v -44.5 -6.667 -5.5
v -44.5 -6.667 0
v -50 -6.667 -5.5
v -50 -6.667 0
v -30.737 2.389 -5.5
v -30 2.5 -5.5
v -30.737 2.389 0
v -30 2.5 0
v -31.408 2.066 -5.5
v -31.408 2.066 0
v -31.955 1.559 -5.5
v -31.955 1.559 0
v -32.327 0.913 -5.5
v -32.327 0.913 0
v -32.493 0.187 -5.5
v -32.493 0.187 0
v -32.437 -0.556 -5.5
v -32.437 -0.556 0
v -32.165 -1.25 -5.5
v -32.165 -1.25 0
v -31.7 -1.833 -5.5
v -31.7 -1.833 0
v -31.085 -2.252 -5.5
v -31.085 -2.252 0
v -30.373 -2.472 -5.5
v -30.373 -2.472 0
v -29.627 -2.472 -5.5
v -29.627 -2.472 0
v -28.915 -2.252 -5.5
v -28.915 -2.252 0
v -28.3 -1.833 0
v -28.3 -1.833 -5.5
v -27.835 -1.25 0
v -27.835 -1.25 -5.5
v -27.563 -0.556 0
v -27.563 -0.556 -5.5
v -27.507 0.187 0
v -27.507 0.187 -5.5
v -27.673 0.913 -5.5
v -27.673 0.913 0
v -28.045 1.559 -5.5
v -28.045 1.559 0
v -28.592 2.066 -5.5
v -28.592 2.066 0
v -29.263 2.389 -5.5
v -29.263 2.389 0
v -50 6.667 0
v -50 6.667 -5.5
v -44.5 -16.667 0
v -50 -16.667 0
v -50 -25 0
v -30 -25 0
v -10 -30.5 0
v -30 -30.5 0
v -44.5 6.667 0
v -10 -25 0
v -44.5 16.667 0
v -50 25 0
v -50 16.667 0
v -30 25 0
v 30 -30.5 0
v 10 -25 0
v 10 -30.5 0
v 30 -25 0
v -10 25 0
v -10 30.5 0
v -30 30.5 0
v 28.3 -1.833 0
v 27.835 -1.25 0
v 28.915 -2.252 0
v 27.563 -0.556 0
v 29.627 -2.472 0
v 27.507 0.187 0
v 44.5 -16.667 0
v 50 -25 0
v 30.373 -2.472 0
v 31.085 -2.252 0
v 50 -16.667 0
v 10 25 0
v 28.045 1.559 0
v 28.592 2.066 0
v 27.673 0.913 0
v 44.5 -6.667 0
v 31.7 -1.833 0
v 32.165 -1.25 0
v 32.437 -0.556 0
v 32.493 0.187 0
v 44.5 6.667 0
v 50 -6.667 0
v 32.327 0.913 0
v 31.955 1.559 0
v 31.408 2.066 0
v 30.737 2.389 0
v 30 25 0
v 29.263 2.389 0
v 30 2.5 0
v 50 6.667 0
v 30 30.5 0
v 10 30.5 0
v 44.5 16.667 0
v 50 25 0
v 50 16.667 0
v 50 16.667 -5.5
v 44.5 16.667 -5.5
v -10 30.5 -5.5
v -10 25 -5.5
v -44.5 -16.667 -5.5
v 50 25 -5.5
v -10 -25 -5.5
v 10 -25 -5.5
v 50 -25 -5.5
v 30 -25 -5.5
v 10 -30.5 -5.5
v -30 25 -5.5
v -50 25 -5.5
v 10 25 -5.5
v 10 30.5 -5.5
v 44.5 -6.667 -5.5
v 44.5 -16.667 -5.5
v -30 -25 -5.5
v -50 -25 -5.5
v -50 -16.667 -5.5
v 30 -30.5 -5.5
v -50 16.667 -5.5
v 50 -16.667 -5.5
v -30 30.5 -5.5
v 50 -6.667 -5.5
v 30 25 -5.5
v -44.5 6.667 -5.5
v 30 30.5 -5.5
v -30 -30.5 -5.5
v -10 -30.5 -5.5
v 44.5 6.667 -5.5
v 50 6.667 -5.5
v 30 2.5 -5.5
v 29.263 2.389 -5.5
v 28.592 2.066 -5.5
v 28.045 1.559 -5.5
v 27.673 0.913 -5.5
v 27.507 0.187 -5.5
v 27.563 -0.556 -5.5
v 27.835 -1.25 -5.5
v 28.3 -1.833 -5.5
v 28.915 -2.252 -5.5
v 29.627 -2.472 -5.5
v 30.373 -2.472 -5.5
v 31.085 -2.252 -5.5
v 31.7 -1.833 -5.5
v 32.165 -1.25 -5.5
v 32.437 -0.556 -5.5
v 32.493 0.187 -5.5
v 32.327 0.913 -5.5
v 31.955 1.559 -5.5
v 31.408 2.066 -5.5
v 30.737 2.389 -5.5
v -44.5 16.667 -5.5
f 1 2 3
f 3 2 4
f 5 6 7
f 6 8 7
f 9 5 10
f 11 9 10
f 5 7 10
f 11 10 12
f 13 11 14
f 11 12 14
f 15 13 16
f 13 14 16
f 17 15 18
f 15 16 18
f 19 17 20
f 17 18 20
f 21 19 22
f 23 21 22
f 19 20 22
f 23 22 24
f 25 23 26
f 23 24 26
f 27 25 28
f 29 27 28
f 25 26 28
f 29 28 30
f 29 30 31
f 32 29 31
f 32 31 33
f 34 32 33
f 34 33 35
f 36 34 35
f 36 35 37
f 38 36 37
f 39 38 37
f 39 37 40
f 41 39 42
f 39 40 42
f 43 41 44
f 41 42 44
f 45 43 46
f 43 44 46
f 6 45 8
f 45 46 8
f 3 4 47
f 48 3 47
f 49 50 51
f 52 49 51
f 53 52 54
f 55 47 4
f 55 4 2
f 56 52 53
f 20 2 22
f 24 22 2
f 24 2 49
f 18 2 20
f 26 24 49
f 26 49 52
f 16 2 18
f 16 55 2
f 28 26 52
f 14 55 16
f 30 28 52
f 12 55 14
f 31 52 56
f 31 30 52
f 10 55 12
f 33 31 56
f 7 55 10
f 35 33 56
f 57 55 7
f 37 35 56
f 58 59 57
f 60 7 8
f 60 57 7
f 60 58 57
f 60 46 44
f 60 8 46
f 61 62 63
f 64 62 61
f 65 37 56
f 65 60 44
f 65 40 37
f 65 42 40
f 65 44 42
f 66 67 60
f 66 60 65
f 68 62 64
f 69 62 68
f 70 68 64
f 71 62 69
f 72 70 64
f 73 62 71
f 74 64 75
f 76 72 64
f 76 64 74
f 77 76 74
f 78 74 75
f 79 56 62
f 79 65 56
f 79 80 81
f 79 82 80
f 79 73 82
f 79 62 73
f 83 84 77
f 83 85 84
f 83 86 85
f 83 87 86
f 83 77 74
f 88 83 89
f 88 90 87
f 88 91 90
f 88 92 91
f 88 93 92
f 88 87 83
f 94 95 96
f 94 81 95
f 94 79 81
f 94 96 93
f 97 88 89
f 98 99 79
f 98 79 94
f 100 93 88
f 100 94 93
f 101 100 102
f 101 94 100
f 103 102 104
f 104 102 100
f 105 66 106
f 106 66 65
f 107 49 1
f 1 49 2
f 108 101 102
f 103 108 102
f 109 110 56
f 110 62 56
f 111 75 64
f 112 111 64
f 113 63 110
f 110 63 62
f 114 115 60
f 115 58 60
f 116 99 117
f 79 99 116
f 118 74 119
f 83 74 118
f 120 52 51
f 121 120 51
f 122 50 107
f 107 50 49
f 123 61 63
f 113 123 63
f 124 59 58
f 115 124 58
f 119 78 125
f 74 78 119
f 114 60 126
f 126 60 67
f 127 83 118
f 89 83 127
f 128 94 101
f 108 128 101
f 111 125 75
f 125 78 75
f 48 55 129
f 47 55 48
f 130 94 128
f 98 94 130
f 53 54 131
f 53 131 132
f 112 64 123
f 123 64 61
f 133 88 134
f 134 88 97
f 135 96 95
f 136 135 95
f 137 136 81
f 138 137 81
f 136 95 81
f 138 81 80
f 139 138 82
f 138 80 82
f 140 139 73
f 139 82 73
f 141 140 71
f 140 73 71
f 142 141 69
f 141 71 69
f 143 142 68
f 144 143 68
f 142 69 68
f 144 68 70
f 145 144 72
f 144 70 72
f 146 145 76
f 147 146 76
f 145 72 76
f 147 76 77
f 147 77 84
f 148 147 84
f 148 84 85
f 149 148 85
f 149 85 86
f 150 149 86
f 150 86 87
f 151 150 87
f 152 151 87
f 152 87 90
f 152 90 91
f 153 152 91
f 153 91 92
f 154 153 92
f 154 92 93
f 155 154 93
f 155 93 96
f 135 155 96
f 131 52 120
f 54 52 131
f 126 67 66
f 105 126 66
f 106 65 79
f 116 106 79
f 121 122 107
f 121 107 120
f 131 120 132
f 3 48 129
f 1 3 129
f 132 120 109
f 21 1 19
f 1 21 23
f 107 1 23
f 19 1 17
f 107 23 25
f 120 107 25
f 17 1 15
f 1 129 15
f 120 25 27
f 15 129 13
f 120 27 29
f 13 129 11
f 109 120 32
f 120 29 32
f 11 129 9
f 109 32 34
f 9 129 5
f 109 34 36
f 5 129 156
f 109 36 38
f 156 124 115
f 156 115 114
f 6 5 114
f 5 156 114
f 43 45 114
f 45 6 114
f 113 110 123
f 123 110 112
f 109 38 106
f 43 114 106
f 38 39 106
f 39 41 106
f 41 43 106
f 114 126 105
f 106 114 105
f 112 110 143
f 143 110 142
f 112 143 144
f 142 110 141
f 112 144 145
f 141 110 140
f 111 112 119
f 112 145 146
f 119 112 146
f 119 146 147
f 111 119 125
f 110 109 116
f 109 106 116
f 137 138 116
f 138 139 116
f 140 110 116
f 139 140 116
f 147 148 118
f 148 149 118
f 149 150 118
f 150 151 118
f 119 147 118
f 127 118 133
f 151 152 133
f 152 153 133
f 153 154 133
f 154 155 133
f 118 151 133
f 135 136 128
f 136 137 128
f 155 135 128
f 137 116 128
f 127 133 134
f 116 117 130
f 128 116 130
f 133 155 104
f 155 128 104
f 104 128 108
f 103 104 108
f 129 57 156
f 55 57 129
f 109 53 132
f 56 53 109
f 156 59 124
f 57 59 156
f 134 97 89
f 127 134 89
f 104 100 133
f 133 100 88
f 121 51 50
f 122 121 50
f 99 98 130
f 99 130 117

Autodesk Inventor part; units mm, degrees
ref_plane "YZ Plane" through (0, 0, 0) normal (1, 0, 0) x (0, 1, 0)
ref_plane "XZ Plane" through (0, 0, 0) normal (0, 1, 0) x (-1, 0, 0)
ref_plane "XY Plane" through (0, 0, 0) normal (0, 0, 1) x (1, 0, 0)
sketch "Block1" plane through (0, 0, 0) normal (0, 0, 1) x (1, 0, 0)
  line L0 (-30.1, 34.1) -> (-9.9, 34.1)
  line L1 (-9.9, 34.1) -> (-9.9, 25.1)
  line L2 (-9.9, 25.1) -> (9.9, 25.1)
  line L3 (9.9, 25.1) -> (9.9, 34.1)
  line L4 (9.9, 34.1) -> (30.1, 34.1)
  line L5 (30.1, 34.1) -> (30.1, 25.1)
  line L6 (30.1, 25.1) -> (50.1, 25.1)
  line L7 (50.1, 25.1) -> (50.1, 16.5667)
  line L8 (50.1, 16.5667) -> (41.1, 16.5667)
  line L9 (41.1, 16.5667) -> (41.1, 6.7667)
  line L10 (41.1, 6.7667) -> (50.1, 6.7667)
  line L11 (50.1, 6.7667) -> (50.1, -6.7667)
  line L12 (50.1, -6.7667) -> (41.1, -6.7667)
  line L13 (41.1, -6.7667) -> (41.1, -16.5667)
  line L14 (41.1, -16.5667) -> (50.1, -16.5667)
  line L15 (50.1, -16.5667) -> (50.1, -25.1)
  line L16 (50.1, -25.1) -> (30.1, -25.1)
  line L17 (30.1, -25.1) -> (30.1, -34.1)
  line L18 (30.1, -34.1) -> (9.9, -34.1)
  line L19 (9.9, -34.1) -> (9.9, -25.1)
  line L20 (9.9, -25.1) -> (-9.9, -25.1)
  line L21 (-9.9, -25.1) -> (-9.9, -34.1)
  line L22 (-9.9, -34.1) -> (-30.1, -34.1)
  line L23 (-30.1, -34.1) -> (-30.1, -25.1)
  line L24 (-30.1, -25.1) -> (-50.1, -25.1)
  line L25 (-50.1, -25.1) -> (-50.1, -16.5667)
  line L26 (-50.1, -16.5667) -> (-41.1, -16.5667)
  line L27 (-41.1, -16.5667) -> (-41.1, -6.7667)
  line L28 (-41.1, -6.7667) -> (-50.1, -6.7667)
  line L29 (-50.1, -6.7667) -> (-50.1, 6.7667)
  line L30 (-50.1, 6.7667) -> (-41.1, 6.7667)
  line L31 (-41.1, 6.7667) -> (-41.1, 16.5667)
  line L32 (-41.1, 16.5667) -> (-50.1, 16.5667)
  line L33 (-50.1, 16.5667) -> (-50.1, 25.1)
  line L34 (-50.1, 25.1) -> (-30.1, 25.1)
  line L35 (-30.1, 25.1) -> (-30.1, 34.1)
  circle A0 centre (-30, 0) radius 4.6
  circle A1 centre (30, 0) radius 4.6
  point P0 (0, 0)
sketch "Block2" plane through (0, 0, 0) normal (0, 0, 1) x (1, 0, 0)
  line L0 (9.8, 34.2) -> (30.2, 34.2)
  line L1 (30.2, 34.2) -> (30.2, 25.2)
  line L2 (30.2, 25.2) -> (50.2, 25.2)
  line L3 (50.2, 25.2) -> (50.2, 16.4667)
  line L4 (50.2, 16.4667) -> (41.2, 16.4667)
  line L5 (41.2, 16.4667) -> (41.2, 6.8667)
  line L6 (41.2, 6.8667) -> (50.2, 6.8667)
  line L7 (50.2, 6.8667) -> (50.2, -6.8667)
  line L8 (50.2, -6.8667) -> (41.2, -6.8667)
  line L9 (41.2, -6.8667) -> (41.2, -16.4667)
  line L10 (41.2, -16.4667) -> (50.2, -16.4667)
  line L11 (50.2, -16.4667) -> (50.2, -25.2)
  line L12 (50.2, -25.2) -> (30.2, -25.2)
  line L13 (30.2, -25.2) -> (30.2, -34.2)
  line L14 (30.2, -34.2) -> (9.8, -34.2)
  line L15 (9.8, -34.2) -> (9.8, -25.2)
  line L16 (9.8, -25.2) -> (-9.8, -25.2)
  line L17 (-9.8, -25.2) -> (-9.8, -34.2)
  line L18 (-9.8, -34.2) -> (-30.2, -34.2)
  line L19 (-30.2, -34.2) -> (-30.2, -25.2)
  line L20 (-30.2, -25.2) -> (-50.2, -25.2)
  line L21 (-50.2, -25.2) -> (-50.2, -16.4667)
  line L22 (-50.2, -16.4667) -> (-41.2, -16.4667)
  line L23 (-41.2, -16.4667) -> (-41.2, -6.8667)
  line L24 (-41.2, -6.8667) -> (-50.2, -6.8667)
  line L25 (-50.2, -6.8667) -> (-50.2, 6.8667)
  line L26 (-50.2, 6.8667) -> (-41.2, 6.8667)
  line L27 (-41.2, 6.8667) -> (-41.2, 16.4667)
  line L28 (-41.2, 16.4667) -> (-50.2, 16.4667)
  line L29 (-50.2, 16.4667) -> (-50.2, 25.2)
  line L30 (-50.2, 25.2) -> (-30.2, 25.2)
  line L31 (-30.2, 25.2) -> (-30.2, 34.2)
  line L32 (-30.2, 34.2) -> (-9.8, 34.2)
  line L33 (-9.8, 34.2) -> (-9.8, 25.2)
  line L34 (-9.8, 25.2) -> (9.8, 25.2)
  line L35 (9.8, 25.2) -> (9.8, 34.2)
  circle A0 centre (30, 0) radius 4.7
  circle A1 centre (-30, 0) radius 4.7
  point P0 (0, 0)
sketch "Block3" plane through (0, 0, 0) normal (0, 0, 1) x (1, 0, 0)
  line L0 (9.9, 34.1) -> (30.1, 34.1)
  line L1 (30.1, 34.1) -> (30.1, 25.1)
  line L2 (30.1, 25.1) -> (50.1, 25.1)
  line L3 (50.1, 25.1) -> (50.1, 16.5667)
  line L4 (50.1, 16.5667) -> (41.1, 16.5667)
  line L5 (41.1, 16.5667) -> (41.1, 6.7667)
  line L6 (41.1, 6.7667) -> (50.1, 6.7667)
  line L7 (50.1, 6.7667) -> (50.1, -6.7667)
  line L8 (50.1, -6.7667) -> (41.1, -6.7667)
  line L9 (41.1, -6.7667) -> (41.1, -16.5667)
  line L10 (41.1, -16.5667) -> (50.1, -16.5667)
  line L11 (50.1, -16.5667) -> (50.1, -25.1)
  line L12 (50.1, -25.1) -> (30.1, -25.1)
  line L13 (30.1, -25.1) -> (30.1, -34.1)
  line L14 (30.1, -34.1) -> (9.9, -34.1)
  line L15 (9.9, -34.1) -> (9.9, -25.1)
  line L16 (9.9, -25.1) -> (-9.9, -25.1)
  line L17 (-9.9, -25.1) -> (-9.9, -34.1)
  line L18 (-9.9, -34.1) -> (-30.1, -34.1)
  line L19 (-30.1, -34.1) -> (-30.1, -25.1)
  line L20 (-30.1, -25.1) -> (-50.1, -25.1)
  line L21 (-50.1, -25.1) -> (-50.1, -16.5667)
  line L22 (-50.1, -16.5667) -> (-41.1, -16.5667)
  line L23 (-41.1, -16.5667) -> (-41.1, -6.7667)
  line L24 (-41.1, -6.7667) -> (-50.1, -6.7667)
  line L25 (-50.1, -6.7667) -> (-50.1, 6.7667)
  line L26 (-50.1, 6.7667) -> (-41.1, 6.7667)
  line L27 (-41.1, 6.7667) -> (-41.1, 16.5667)
  line L28 (-41.1, 16.5667) -> (-50.1, 16.5667)
  line L29 (-50.1, 16.5667) -> (-50.1, 25.1)
  line L30 (-50.1, 25.1) -> (-30.1, 25.1)
  line L31 (-30.1, 25.1) -> (-30.1, 34.1)
  line L32 (-30.1, 34.1) -> (-9.9, 34.1)
  line L33 (-9.9, 34.1) -> (-9.9, 25.1)
  line L34 (-9.9, 25.1) -> (9.9, 25.1)
  line L35 (9.9, 25.1) -> (9.9, 34.1)
  circle A0 centre (-30, 0) radius 4.6
  circle A1 centre (30, 0) radius 4.6
  point P0 (0, 0)
sketch "Block4" plane through (10, 0, 0) normal (0, 1, 0) x (1, 0, 0)
  line L0 (-30.08, 30.58) -> (-9.92, 30.58)
  line L1 (-9.92, 30.58) -> (-9.92, 25.08)
  line L2 (-9.92, 25.08) -> (9.92, 25.08)
  line L3 (9.92, 25.08) -> (9.92, 30.58)
  line L4 (9.92, 30.58) -> (30.08, 30.58)
  line L5 (30.08, 30.58) -> (30.08, 25.08)
  line L6 (30.08, 25.08) -> (50.08, 25.08)
  line L7 (50.08, 25.08) -> (50.08, 16.5867)
  line L8 (50.08, 16.5867) -> (44.58, 16.5867)
  line L9 (44.58, 16.5867) -> (44.58, 6.7467)
  line L10 (44.58, 6.7467) -> (50.08, 6.7467)
  line L11 (50.08, 6.7467) -> (50.08, -6.7467)
  line L12 (50.08, -6.7467) -> (44.58, -6.7467)
  line L13 (44.58, -6.7467) -> (44.58, -16.5867)
  line L14 (44.58, -16.5867) -> (50.08, -16.5867)
  line L15 (50.08, -16.5867) -> (50.08, -25.08)
  line L16 (50.08, -25.08) -> (30.08, -25.08)
  line L17 (30.08, -25.08) -> (30.08, -30.58)
  line L18 (30.08, -30.58) -> (9.92, -30.58)
  line L19 (9.92, -30.58) -> (9.92, -25.08)
  line L20 (9.92, -25.08) -> (-9.92, -25.08)
  line L21 (-9.92, -25.08) -> (-9.92, -30.58)
  line L22 (-9.92, -30.58) -> (-30.08, -30.58)
  line L23 (-30.08, -30.58) -> (-30.08, -25.08)
  line L24 (-30.08, -25.08) -> (-50.08, -25.08)
  line L25 (-50.08, -25.08) -> (-50.08, -16.5867)
  line L26 (-50.08, -16.5867) -> (-44.58, -16.5867)
  line L27 (-44.58, -16.5867) -> (-44.58, -6.7467)
  line L28 (-44.58, -6.7467) -> (-50.08, -6.7467)
  line L29 (-50.08, -6.7467) -> (-50.08, 6.7467)
  line L30 (-50.08, 6.7467) -> (-44.58, 6.7467)
  line L31 (-44.58, 6.7467) -> (-44.58, 16.5867)
  line L32 (-44.58, 16.5867) -> (-50.08, 16.5867)
  line L33 (-50.08, 16.5867) -> (-50.08, 25.08)
  line L34 (-50.08, 25.08) -> (-30.08, 25.08)
  line L35 (-30.08, 25.08) -> (-30.08, 30.58)
  circle A0 centre (-30, 0) radius 4.88
  circle A1 centre (30, 0) radius 4.88
  point P0 (0, 0)
sketch "Block5" plane through (10, 0, 0) normal (0, 1, 0) x (1, 0, 0)
  line L0 (-30.08, 30.58) -> (-9.92, 30.58)
  line L1 (-9.92, 30.58) -> (-9.92, 25.08)
  line L2 (-9.92, 25.08) -> (9.92, 25.08)
  line L3 (9.92, 25.08) -> (9.92, 30.58)
  line L4 (9.92, 30.58) -> (30.08, 30.58)
  line L5 (30.08, 30.58) -> (30.08, 25.08)
  line L6 (30.08, 25.08) -> (50.08, 25.08)
  line L7 (50.08, 25.08) -> (50.08, 16.5867)
  line L8 (50.08, 16.5867) -> (44.58, 16.5867)
  line L9 (44.58, 16.5867) -> (44.58, 6.7467)
  line L10 (44.58, 6.7467) -> (50.08, 6.7467)
  line L11 (50.08, 6.7467) -> (50.08, -6.7467)
  line L12 (50.08, -6.7467) -> (44.58, -6.7467)
  line L13 (44.58, -6.7467) -> (44.58, -16.5867)
  line L14 (44.58, -16.5867) -> (50.08, -16.5867)
  line L15 (50.08, -16.5867) -> (50.08, -25.08)
  line L16 (50.08, -25.08) -> (30.08, -25.08)
  line L17 (30.08, -25.08) -> (30.08, -30.58)
  line L18 (30.08, -30.58) -> (9.92, -30.58)
  line L19 (9.92, -30.58) -> (9.92, -25.08)
  line L20 (9.92, -25.08) -> (-9.92, -25.08)
  line L21 (-9.92, -25.08) -> (-9.92, -30.58)
  line L22 (-9.92, -30.58) -> (-30.08, -30.58)
  line L23 (-30.08, -30.58) -> (-30.08, -25.08)
  line L24 (-30.08, -25.08) -> (-50.08, -25.08)
  line L25 (-50.08, -25.08) -> (-50.08, -16.5867)
  line L26 (-50.08, -16.5867) -> (-44.58, -16.5867)
  line L27 (-44.58, -16.5867) -> (-44.58, -6.7467)
  line L28 (-44.58, -6.7467) -> (-50.08, -6.7467)
  line L29 (-50.08, -6.7467) -> (-50.08, 6.7467)
  line L30 (-50.08, 6.7467) -> (-44.58, 6.7467)
  line L31 (-44.58, 6.7467) -> (-44.58, 16.5867)
  line L32 (-44.58, 16.5867) -> (-50.08, 16.5867)
  line L33 (-50.08, 16.5867) -> (-50.08, 25.08)
  line L34 (-50.08, 25.08) -> (-30.08, 25.08)
  line L35 (-30.08, 25.08) -> (-30.08, 30.58)
  circle A0 centre (-30, 0) radius 4.83
  circle A1 centre (30, 0) radius 4.83
  point P0 (0, 0)
sketch "Sketch10" plane through (0, 0, 0) normal (0, 0, 1) x (1, 0, 0)
  line L0 (50, -25) -> (-50, -25)
  line L1 (-50, -25) -> (-50, 25)
  line L2 (-50, 25) -> (50, 25)
  line L3 (50, 25) -> (50, -25)
  line L4 (50, -25) -> (-50, 25) construction
  line L5 (-50, -25) -> (50, 25) construction
  point P0 (0, 0)
  dimension "d21" = 100
  dimension "d22" = 50
extrude "Extrusion2" add sketch "Sketch10" against normal blind 5.5
sketch "Sketch16" plane through (0, 0, -5.5) normal (0, 0, -1) x (-1, 0, 0)
  line L0 (0, -49.304) -> (0, 48.0007) projected
  point P0 (0, 0)
  point P1 (-30, 0)
  point P2 (30, 0)
  dimension "d52" = 60
hole "Hole5" at (30, 0, -5.5) at (-30, 0, -5.5) direction (0, 0, 1) diameter 5 end through all
sketch "Sketch35" plane through (0, 0, 0) normal (0, 0, 1) x (1, 0, 0)
  line L0 (-50, 25) -> (50, 25) projected
  line L1 (-50, -25) -> (-50, 25) projected
  line L2 (0, -49.304) -> (0, 48.0007) projected
  line L3 (-213.651, 0) -> (108.296, 0) projected
  line L4 (50, 25) -> (50, -25) projected
  line L5 (-30, 25) -> (-30, 30.5)
  line L6 (-30, 30.5) -> (-10, 30.5)
  line L7 (-10, 30.5) -> (-10, 25)
  line L8 (-30, 25) -> (-10, 25)
  line L9 (30, 25) -> (30, 30.5)
  line L10 (30, 30.5) -> (10, 30.5)
  line L11 (10, 30.5) -> (10, 25)
  line L12 (30, 25) -> (10, 25)
  line L13 (-30, -25) -> (-30, -30.5)
  line L14 (-30, -30.5) -> (-10, -30.5)
  line L15 (-10, -30.5) -> (-10, -25)
  line L16 (-30, -25) -> (-10, -25)
  line L17 (30, -25) -> (30, -30.5)
  line L18 (30, -25) -> (10, -25)
  line L19 (30, -30.5) -> (10, -30.5)
  line L20 (10, -30.5) -> (10, -25)
  point P0 (0, 0)
  point P1 (-50, 16.6667)
  point P2 (-50, 4.1667)
  dimension "d129" = 20
  dimension "d130" = 20
  dimension "d131" = 5.5
extrude "Extrusion6" add sketch "Sketch35" against normal blind 5.5 contours L5 L6 L7 L0 | L11 L10 L9 L0 | L16 L15 L14 L13 | L17 L19 L20 L18
sketch "Sketch36" plane through (0, 0, 0) normal (0, 0, 1) x (1, 0, 0)
  line L0 (-50, 25) -> (-30, 25) projected
  line L1 (-50, -25) -> (-50, 25) projected
  line L2 (-50, 16.6667) -> (-44.5, 16.6667)
  line L3 (-44.5, 16.6667) -> (-44.5, 6.6667)
  line L4 (-44.5, 6.6667) -> (-50, 6.6667)
  line L5 (-50, 6.6667) -> (-50, 16.6667)
  line L6 (-211.2102, 0) -> (93.6517, 0) projected
  line L7 (0, -49.304) -> (0, 48.0007) projected
  line L8 (-50, -16.6667) -> (-44.5, -16.6667)
  line L9 (-44.5, -16.6667) -> (-44.5, -6.6667)
  line L10 (-44.5, -6.6667) -> (-50, -6.6667)
  line L11 (-50, -6.6667) -> (-50, -16.6667)
  line L12 (50, 16.6667) -> (44.5, 16.6667)
  line L13 (44.5, 16.6667) -> (44.5, 6.6667)
  line L14 (44.5, 6.6667) -> (50, 6.6667)
  line L15 (50, 6.6667) -> (50, 16.6667)
  line L16 (44.5, -16.6667) -> (44.5, -6.6667)
  line L17 (44.5, -6.6667) -> (50, -6.6667)
  line L18 (50, -6.6667) -> (50, -16.6667)
  line L19 (50, -16.6667) -> (44.5, -16.6667)
  point P0 (0, 0)
  dimension "d144" = 5.5
  dimension "d145" = 10
  dimension "d146" = 8.3333
extrude "Extrusion7" cut sketch "Sketch36" against normal through all
equation "\"d23\" = Wt"
equation "\"d129\" = 0.2 * d21"
equation "\"d130\" = 0.2 * d21"
equation "\"d131\" = Wt"
equation "\"d142\" = Wt"
equation "\"d144\" = Wt"
equation "\"d145\" = 0.2 * d22"
equation "\"d146\" = 0.166667 * d22"
equation "\"d147\" = Wt"
equation "\"Wt\" = 5.5"
properties part number "holder_plate" material "Wood (Birch)"
